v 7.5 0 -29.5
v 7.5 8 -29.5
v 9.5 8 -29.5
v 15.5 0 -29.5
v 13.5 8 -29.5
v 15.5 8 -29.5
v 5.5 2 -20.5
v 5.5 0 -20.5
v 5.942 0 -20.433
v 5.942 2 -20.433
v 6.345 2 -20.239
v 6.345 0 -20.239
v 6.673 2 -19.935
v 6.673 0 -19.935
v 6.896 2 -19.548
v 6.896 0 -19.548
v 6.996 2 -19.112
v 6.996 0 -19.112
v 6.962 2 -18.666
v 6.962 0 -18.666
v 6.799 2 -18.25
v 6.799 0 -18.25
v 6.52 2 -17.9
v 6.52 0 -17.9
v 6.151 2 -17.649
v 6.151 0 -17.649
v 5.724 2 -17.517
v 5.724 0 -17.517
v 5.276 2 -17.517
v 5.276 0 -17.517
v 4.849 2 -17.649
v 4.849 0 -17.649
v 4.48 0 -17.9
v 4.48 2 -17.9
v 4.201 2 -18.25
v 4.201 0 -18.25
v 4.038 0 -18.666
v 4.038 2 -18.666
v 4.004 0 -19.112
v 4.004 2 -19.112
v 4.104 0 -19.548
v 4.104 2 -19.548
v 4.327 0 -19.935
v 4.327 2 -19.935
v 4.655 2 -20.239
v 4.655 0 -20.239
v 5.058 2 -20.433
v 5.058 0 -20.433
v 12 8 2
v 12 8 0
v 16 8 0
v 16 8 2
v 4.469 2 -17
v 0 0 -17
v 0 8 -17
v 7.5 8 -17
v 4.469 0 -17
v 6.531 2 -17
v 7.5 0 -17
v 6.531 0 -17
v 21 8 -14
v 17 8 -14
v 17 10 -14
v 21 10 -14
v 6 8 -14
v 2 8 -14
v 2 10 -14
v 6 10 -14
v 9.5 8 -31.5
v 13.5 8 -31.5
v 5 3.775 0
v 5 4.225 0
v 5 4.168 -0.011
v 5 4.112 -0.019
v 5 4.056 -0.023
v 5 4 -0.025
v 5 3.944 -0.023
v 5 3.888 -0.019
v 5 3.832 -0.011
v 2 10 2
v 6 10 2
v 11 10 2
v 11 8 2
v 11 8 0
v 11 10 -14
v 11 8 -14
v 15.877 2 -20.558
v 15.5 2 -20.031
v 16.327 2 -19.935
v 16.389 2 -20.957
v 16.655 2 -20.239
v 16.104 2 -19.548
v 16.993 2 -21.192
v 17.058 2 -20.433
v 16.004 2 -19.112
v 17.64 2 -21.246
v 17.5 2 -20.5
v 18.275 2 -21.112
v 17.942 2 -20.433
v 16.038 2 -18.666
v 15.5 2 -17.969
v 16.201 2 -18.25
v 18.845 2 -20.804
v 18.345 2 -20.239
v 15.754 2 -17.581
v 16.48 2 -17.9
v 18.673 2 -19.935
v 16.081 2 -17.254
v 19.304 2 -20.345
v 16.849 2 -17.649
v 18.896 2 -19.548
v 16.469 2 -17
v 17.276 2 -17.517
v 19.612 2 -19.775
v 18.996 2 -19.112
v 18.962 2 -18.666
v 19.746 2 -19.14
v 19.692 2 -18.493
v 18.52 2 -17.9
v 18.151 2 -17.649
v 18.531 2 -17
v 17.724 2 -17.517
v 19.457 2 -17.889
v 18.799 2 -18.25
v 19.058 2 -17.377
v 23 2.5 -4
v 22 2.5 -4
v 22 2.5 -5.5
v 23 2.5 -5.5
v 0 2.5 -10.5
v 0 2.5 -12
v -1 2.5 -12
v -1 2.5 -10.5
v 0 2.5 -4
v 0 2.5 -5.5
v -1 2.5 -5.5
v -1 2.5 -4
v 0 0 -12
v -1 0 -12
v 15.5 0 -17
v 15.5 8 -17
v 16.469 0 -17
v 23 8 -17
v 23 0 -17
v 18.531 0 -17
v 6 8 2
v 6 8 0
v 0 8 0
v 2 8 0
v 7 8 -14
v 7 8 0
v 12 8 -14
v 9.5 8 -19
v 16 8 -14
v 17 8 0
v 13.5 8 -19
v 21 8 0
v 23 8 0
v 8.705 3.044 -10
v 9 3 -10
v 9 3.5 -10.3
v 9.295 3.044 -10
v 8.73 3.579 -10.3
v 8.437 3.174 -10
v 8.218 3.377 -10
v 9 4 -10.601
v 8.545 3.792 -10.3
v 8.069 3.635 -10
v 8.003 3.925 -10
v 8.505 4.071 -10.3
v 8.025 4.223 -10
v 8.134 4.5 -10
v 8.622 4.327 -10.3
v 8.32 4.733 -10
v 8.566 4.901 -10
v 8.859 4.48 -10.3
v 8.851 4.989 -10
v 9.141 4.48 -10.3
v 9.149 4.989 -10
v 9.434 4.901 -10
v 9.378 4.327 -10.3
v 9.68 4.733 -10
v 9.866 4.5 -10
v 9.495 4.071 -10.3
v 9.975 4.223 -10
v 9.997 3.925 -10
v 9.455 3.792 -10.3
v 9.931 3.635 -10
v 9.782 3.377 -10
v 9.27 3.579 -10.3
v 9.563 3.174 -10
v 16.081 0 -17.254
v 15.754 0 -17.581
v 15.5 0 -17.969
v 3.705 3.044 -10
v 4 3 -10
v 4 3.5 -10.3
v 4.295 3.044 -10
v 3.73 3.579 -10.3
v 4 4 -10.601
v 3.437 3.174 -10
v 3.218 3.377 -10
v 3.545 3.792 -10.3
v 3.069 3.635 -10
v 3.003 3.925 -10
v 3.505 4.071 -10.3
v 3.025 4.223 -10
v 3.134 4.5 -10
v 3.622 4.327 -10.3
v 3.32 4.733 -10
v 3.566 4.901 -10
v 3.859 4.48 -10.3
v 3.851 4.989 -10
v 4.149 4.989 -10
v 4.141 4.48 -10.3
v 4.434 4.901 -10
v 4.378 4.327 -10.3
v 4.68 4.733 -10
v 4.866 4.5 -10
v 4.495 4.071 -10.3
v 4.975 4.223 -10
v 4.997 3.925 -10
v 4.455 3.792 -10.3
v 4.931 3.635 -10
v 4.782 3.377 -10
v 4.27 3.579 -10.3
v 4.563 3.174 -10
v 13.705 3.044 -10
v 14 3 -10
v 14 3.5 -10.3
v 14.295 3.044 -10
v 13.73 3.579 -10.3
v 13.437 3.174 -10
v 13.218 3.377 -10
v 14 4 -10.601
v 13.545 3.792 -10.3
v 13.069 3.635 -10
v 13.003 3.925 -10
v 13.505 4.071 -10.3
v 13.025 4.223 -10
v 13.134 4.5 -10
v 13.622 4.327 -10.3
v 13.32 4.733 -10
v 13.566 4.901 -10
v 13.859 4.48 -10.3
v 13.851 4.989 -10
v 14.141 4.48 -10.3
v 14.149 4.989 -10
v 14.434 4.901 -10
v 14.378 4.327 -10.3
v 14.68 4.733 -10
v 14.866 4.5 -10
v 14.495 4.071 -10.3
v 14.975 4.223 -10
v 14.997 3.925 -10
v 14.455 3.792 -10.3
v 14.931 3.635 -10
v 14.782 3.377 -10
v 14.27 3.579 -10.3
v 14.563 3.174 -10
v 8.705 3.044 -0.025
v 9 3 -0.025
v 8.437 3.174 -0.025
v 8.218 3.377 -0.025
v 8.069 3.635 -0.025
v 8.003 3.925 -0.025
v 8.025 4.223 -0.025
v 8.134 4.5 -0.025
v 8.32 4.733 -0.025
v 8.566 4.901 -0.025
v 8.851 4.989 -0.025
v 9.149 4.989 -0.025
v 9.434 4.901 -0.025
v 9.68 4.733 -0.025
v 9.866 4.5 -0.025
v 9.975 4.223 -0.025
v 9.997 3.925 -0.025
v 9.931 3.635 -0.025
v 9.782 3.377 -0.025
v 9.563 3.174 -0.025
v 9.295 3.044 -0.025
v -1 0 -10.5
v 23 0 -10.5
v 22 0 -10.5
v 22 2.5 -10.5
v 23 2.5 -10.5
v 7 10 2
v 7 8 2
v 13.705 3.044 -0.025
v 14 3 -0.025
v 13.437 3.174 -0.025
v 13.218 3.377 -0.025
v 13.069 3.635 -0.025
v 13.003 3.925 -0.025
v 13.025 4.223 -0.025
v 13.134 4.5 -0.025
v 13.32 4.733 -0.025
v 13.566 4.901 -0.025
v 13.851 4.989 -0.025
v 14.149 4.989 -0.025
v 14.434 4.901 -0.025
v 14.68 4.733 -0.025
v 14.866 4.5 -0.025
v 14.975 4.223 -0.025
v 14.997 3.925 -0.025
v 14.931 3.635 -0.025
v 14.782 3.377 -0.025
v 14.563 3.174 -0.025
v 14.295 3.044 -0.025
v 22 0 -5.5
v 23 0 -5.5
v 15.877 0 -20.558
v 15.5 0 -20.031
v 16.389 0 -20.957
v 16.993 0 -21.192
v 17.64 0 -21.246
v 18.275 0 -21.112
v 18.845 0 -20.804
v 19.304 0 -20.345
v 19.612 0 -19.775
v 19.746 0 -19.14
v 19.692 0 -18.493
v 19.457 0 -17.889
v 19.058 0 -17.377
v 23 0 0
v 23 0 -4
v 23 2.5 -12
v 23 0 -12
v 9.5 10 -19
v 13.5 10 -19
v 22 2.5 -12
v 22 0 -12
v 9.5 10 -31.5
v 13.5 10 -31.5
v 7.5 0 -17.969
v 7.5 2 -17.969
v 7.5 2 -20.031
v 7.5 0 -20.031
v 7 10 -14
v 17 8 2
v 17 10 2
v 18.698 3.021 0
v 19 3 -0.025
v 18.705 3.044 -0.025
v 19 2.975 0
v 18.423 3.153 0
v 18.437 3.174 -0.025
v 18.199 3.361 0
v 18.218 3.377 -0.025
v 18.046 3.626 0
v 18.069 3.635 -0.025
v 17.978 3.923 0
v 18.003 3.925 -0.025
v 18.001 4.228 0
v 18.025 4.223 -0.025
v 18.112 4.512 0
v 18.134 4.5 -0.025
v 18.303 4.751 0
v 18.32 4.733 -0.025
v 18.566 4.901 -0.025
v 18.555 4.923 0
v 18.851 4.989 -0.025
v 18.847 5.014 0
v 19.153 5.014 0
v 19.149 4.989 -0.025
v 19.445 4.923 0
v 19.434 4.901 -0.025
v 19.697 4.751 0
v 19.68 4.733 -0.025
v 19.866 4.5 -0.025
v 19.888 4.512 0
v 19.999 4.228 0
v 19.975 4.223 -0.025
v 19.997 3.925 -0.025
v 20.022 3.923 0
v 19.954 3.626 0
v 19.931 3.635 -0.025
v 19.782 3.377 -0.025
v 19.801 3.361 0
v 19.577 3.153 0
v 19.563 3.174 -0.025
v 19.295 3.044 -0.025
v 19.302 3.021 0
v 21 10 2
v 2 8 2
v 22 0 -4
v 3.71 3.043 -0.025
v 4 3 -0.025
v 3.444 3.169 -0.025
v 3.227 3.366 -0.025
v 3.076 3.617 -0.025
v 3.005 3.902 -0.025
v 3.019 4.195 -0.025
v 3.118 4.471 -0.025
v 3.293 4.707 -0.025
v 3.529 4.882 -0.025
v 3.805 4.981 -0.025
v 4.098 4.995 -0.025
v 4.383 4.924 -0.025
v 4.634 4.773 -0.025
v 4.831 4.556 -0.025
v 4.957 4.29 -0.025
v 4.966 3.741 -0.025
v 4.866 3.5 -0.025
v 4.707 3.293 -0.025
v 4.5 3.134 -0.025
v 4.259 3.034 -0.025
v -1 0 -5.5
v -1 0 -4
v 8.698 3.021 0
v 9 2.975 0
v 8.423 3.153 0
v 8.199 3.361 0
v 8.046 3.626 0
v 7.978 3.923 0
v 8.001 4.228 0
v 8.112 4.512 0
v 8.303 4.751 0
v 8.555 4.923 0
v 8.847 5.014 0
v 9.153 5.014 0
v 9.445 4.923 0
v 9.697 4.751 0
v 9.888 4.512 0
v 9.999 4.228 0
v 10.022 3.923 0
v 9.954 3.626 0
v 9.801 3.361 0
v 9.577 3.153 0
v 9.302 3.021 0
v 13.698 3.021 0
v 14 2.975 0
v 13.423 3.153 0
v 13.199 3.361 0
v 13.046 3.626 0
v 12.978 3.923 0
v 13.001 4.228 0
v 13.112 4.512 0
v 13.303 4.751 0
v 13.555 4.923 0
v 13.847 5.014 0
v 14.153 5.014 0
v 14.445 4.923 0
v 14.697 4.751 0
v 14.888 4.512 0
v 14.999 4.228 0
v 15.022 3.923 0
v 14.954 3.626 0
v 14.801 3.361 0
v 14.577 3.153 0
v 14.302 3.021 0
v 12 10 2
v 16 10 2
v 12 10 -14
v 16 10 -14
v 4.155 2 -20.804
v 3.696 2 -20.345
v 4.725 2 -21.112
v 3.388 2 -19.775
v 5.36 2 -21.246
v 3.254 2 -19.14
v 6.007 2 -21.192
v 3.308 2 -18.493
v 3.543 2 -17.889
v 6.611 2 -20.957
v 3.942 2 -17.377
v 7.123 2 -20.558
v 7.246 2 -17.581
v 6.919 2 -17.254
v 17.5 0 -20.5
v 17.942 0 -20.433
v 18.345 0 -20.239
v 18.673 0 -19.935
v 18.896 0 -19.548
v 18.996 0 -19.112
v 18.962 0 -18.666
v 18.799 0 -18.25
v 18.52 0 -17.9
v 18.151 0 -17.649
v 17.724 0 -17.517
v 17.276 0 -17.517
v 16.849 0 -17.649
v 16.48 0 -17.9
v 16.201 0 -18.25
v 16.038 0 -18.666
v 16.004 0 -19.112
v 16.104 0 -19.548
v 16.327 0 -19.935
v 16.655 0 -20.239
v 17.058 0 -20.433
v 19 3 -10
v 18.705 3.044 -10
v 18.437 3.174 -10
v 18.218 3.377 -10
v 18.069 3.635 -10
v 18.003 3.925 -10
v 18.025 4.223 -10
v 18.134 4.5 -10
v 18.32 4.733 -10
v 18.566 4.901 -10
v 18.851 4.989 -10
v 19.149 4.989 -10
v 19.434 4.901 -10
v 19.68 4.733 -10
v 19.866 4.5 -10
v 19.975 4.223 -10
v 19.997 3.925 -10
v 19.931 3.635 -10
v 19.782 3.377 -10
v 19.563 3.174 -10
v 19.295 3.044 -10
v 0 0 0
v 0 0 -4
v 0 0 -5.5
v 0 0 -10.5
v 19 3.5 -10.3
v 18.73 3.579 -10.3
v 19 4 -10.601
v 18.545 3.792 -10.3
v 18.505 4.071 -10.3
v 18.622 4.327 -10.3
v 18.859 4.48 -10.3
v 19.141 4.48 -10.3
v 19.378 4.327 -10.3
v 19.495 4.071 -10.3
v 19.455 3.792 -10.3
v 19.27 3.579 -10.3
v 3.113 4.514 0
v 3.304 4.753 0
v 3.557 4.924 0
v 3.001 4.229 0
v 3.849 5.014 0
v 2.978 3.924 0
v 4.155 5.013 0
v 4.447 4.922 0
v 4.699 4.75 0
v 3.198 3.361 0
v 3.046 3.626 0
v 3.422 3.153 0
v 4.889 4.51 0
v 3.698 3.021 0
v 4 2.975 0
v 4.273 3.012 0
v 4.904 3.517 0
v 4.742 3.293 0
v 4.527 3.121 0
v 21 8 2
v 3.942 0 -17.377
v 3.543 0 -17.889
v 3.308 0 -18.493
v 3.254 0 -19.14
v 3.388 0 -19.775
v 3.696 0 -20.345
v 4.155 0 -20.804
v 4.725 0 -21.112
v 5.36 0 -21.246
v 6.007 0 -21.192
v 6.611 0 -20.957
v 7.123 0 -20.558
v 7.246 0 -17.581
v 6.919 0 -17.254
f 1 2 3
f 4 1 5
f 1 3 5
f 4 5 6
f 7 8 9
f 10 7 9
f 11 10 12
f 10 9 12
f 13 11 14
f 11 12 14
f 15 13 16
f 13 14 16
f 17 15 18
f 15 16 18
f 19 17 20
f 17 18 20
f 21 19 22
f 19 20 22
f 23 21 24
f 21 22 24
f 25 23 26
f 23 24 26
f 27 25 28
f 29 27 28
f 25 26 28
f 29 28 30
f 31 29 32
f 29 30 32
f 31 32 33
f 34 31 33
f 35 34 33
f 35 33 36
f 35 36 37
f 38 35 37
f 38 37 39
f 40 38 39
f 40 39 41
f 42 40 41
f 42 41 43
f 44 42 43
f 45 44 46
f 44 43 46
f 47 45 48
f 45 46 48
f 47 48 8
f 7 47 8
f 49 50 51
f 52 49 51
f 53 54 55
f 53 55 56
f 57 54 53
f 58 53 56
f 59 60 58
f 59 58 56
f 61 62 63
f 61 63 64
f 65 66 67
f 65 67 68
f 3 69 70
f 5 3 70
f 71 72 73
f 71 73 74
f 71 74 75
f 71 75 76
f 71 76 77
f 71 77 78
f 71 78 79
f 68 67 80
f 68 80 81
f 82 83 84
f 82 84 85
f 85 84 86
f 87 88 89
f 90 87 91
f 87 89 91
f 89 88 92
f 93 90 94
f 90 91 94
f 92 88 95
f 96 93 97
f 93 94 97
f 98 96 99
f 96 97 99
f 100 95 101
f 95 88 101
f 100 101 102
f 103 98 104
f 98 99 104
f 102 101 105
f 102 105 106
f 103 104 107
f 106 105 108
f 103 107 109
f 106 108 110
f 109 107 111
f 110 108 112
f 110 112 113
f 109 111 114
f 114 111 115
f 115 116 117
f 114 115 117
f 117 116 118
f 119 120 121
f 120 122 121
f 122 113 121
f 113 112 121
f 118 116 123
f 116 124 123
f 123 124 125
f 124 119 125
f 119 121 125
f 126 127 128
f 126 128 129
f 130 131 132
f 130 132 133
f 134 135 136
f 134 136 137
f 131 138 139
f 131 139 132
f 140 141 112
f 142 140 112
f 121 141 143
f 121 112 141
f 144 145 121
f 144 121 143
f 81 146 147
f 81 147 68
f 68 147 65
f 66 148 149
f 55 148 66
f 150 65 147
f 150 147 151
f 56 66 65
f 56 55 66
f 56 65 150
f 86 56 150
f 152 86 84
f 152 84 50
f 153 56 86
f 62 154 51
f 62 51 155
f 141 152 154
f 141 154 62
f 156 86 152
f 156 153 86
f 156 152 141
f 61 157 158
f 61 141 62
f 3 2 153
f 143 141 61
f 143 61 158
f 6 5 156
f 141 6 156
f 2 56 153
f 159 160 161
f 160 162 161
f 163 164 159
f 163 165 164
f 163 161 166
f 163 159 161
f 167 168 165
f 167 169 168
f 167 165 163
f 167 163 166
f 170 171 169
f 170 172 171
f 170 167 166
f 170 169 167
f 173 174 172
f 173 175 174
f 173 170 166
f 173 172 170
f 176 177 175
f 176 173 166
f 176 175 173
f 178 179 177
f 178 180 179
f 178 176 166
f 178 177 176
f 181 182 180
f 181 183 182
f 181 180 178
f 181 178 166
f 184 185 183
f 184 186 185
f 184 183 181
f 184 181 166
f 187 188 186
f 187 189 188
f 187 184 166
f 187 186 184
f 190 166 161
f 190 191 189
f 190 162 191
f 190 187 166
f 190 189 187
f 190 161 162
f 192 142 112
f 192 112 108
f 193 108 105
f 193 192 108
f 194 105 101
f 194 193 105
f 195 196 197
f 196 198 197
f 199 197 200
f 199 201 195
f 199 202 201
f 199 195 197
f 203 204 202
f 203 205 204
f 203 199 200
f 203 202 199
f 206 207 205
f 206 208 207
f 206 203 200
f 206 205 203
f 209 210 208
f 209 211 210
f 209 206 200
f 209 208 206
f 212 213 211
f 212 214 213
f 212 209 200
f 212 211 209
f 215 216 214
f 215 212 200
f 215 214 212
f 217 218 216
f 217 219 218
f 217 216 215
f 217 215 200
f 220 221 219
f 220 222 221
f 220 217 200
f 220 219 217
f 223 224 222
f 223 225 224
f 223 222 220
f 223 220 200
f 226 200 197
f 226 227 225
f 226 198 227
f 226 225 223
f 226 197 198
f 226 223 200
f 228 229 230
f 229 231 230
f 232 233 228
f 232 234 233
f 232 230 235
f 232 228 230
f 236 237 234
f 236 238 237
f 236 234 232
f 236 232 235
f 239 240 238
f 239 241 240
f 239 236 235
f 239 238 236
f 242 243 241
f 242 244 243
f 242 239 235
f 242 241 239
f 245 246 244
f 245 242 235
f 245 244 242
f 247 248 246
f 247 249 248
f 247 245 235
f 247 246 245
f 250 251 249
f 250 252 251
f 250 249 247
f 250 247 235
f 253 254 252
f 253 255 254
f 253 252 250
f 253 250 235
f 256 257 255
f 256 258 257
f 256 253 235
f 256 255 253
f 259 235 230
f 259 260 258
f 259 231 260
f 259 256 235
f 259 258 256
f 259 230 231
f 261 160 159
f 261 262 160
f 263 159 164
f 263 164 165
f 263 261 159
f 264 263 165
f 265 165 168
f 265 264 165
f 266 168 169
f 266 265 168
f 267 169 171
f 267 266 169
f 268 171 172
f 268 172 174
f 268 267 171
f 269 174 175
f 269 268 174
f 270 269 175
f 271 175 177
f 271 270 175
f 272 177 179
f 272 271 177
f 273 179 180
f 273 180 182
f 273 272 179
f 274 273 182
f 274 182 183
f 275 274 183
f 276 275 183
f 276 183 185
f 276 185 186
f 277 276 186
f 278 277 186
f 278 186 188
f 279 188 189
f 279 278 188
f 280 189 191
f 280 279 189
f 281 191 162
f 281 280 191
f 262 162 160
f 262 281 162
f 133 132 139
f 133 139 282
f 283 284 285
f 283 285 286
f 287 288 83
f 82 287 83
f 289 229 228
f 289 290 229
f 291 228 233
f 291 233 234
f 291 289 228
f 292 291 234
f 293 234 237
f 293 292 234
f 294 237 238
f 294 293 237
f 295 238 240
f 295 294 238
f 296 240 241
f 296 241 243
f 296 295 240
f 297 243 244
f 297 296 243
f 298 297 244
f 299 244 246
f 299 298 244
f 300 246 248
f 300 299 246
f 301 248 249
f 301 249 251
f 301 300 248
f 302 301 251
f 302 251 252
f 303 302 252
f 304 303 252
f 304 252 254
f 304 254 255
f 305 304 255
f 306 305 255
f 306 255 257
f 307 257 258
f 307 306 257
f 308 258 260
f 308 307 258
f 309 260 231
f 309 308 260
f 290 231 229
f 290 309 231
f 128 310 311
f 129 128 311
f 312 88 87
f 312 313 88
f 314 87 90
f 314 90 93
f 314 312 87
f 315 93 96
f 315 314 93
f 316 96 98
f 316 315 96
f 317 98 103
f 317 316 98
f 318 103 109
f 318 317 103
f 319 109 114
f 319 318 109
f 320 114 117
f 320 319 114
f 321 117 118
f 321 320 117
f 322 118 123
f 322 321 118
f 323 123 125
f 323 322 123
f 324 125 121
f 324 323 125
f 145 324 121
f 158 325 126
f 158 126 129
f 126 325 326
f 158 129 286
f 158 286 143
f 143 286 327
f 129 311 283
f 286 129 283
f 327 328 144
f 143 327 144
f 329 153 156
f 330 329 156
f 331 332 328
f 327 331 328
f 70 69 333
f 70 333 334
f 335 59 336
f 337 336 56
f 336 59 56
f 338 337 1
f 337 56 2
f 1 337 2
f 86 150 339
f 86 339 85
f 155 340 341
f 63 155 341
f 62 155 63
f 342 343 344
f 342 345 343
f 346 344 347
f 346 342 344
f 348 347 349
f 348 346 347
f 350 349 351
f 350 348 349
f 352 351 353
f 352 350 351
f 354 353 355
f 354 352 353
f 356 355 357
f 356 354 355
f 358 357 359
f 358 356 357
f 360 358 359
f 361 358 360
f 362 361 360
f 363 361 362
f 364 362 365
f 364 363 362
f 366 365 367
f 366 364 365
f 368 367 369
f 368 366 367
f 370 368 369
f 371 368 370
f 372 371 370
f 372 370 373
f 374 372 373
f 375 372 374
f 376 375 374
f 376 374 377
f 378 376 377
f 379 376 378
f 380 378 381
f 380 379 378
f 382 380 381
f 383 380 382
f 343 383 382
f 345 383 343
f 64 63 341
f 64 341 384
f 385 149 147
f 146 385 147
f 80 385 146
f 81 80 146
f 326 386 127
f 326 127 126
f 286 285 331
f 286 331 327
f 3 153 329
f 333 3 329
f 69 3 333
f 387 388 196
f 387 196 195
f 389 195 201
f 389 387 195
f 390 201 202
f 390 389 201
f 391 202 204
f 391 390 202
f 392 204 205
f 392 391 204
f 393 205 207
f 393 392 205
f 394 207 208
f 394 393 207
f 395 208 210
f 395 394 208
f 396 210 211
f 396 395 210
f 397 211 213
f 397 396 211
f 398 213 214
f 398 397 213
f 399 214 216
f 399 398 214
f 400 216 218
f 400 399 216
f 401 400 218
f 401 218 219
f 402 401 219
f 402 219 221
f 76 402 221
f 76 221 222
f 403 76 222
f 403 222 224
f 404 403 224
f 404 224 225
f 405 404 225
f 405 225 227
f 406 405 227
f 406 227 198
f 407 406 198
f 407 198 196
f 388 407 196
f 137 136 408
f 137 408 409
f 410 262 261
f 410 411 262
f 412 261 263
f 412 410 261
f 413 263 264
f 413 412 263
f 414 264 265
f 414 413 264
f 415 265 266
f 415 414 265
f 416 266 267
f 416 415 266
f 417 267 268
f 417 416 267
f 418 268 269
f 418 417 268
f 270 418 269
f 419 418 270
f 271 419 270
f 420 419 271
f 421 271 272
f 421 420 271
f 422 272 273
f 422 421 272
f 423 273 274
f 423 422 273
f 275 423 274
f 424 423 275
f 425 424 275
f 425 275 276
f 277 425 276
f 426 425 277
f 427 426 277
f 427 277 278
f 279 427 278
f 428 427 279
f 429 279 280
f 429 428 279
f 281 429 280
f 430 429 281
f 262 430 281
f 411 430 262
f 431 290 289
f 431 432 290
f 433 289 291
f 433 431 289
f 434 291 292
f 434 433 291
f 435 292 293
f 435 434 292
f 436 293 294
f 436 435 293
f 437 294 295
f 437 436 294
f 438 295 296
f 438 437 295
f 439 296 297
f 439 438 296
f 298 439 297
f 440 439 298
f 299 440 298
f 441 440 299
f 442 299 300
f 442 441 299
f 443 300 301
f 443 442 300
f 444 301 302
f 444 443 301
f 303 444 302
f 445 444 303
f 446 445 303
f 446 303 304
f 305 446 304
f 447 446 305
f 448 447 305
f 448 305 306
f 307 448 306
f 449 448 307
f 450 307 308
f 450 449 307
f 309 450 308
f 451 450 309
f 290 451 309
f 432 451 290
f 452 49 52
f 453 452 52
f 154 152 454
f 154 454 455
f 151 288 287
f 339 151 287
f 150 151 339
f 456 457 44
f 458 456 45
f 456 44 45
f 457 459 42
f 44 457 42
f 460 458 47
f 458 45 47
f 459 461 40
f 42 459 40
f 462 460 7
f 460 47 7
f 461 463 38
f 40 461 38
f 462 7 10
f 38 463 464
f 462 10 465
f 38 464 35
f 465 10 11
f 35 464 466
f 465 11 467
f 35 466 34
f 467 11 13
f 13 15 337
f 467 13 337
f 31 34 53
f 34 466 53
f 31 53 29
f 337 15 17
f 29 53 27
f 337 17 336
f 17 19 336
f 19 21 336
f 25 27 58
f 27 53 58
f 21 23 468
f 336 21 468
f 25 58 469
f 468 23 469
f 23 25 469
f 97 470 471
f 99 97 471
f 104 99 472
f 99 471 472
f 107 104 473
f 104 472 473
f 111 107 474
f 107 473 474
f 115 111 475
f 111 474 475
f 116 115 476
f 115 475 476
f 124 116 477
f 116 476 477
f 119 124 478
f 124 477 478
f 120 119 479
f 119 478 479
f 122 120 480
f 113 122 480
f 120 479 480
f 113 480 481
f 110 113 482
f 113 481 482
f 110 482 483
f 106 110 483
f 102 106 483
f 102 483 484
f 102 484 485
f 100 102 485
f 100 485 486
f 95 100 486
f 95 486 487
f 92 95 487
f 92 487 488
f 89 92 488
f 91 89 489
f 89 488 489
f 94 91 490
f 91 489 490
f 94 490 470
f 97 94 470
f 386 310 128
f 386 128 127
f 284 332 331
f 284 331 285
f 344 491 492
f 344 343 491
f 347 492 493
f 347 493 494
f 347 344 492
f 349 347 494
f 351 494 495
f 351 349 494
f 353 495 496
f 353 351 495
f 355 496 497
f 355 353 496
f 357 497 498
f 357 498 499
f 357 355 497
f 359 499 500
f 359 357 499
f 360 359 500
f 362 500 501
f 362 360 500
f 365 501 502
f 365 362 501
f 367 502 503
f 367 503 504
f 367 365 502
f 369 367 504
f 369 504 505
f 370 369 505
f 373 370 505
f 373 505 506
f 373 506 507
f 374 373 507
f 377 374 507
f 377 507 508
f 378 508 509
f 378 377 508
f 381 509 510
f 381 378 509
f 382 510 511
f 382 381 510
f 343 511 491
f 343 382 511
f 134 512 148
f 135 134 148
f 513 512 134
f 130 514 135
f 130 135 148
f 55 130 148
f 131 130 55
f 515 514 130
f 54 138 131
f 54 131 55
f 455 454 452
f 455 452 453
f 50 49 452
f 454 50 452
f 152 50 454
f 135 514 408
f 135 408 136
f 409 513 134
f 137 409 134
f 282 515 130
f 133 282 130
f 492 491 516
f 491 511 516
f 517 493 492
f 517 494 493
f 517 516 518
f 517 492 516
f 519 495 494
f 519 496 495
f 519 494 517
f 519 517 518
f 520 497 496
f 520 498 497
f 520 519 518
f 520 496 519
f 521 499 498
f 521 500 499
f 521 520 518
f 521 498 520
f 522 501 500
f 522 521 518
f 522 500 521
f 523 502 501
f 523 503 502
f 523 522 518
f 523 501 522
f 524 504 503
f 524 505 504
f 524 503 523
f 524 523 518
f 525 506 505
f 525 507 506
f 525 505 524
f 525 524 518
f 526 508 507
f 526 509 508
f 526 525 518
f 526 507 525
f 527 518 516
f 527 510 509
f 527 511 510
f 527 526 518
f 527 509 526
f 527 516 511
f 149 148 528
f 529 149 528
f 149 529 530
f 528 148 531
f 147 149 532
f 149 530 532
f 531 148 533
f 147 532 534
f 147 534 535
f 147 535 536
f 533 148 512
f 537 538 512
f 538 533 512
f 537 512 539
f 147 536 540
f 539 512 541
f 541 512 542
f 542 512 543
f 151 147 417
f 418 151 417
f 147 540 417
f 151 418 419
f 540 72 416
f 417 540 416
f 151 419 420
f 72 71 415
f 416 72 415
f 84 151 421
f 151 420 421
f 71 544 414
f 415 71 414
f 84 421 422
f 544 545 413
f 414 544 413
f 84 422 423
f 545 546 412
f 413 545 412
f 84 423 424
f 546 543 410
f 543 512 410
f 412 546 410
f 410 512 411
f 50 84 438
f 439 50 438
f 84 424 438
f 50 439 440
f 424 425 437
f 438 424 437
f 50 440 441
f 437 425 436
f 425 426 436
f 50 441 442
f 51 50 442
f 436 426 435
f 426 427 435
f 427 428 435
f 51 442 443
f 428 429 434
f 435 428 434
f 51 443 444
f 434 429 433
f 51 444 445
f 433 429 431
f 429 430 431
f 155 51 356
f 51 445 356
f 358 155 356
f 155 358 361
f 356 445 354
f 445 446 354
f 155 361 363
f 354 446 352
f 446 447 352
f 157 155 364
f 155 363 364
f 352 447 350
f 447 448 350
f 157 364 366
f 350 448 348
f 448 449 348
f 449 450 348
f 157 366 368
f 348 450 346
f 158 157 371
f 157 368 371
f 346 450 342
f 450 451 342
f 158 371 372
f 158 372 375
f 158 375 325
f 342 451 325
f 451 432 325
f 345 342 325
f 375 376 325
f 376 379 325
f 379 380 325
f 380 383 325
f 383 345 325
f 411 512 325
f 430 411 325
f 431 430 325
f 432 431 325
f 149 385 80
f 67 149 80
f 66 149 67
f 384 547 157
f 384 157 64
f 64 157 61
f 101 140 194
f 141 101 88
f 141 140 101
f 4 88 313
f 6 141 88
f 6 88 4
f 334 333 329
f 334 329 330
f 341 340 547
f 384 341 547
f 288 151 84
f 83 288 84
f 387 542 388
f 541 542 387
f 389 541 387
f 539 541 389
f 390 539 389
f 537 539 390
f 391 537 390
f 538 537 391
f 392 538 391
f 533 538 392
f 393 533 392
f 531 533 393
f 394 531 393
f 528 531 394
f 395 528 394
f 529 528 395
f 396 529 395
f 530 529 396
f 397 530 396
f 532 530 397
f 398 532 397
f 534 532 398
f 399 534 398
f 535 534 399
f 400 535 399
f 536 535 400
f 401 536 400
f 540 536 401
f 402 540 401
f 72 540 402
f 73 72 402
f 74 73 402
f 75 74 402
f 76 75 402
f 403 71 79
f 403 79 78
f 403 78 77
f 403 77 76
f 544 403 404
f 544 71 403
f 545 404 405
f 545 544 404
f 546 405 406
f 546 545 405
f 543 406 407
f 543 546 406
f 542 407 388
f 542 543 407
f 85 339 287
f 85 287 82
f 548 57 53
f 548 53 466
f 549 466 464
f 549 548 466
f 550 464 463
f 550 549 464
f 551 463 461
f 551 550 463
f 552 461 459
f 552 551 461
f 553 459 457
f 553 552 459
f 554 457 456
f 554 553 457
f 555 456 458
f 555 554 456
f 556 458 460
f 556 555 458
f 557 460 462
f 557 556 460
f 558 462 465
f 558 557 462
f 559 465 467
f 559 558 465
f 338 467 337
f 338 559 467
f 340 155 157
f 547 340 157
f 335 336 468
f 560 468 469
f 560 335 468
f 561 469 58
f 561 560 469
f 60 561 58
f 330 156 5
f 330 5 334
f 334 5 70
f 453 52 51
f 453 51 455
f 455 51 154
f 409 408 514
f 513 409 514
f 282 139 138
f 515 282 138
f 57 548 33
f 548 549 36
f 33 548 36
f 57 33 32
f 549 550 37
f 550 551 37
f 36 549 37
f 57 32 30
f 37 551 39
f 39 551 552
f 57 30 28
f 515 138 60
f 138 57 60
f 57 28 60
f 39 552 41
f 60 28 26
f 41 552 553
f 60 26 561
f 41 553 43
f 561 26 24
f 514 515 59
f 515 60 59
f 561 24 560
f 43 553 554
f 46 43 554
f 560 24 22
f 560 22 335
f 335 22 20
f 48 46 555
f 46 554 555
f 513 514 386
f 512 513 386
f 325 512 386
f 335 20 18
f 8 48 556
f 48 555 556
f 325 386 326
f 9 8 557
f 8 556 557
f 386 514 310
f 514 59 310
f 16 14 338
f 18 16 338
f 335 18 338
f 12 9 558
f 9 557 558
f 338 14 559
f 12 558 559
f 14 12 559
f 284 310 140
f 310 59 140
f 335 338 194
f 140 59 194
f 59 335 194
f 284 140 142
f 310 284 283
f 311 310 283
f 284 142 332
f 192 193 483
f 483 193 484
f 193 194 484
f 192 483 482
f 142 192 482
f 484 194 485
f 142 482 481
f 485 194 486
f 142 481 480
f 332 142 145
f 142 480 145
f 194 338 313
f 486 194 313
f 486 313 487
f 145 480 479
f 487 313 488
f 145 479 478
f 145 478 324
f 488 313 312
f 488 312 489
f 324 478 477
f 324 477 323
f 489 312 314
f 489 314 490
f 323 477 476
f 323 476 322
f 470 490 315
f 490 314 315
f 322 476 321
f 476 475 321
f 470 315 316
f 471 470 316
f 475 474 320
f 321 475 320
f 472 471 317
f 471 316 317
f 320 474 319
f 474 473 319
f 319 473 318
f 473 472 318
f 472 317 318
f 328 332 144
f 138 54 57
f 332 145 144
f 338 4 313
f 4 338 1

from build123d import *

# Parameters (mm, degrees)
SKETCH1_W                  = 8
SKETCH1_H                  = 17
CONNECTOR_BODY_DEPTH       = 8
SKETCH4_W                  = 4
SKETCH4_H                  = 16
CLAMP_DEPTH                = 2
CONNECTOR_PATTERN_COUNT    = 4
CONNECTOR_PATTERN_PITCH    = 5
SKETCH5_W                  = 8
SKETCH5_H                  = 12.5
SINGLE_BODY_DEPTH          = 8
SKETCH6_W                  = 1.5
SKETCH6_H                  = 2.500390225
CHAINING_NOBS_DEPTH        = 1
SKETCH7_W                  = 1
SKETCH7_H                  = 1.5
CHAINING_NOBS_CUTOUT_DEPTH = 2.50039
SKETCH8_W                  = 4
SKETCH8_H                  = 12.5
SINGLE_BODY_CLAMP_DEPTH    = 2
SKETCH9_R                  = 2.25
SKETCH9_R_2                = 1.5
MOUNTING_RINGS_DEPTH       = 2


with BuildPart() as part:
    # Sketch1 → connector_body (new body)
    with BuildSketch(Plane(origin=(0, 0, 0), x_dir=(1, 0, 0), z_dir=(0, 1, 0))):
        with Locations((4, 8.5)):
            Rectangle(SKETCH1_W, SKETCH1_H)
    connector_body = extrude(amount=CONNECTOR_BODY_DEPTH)

    # Sketch3 → cable_hole (revolve, cut)
    with BuildSketch(Plane(origin=(4, 4, 0), x_dir=(0, -1, 0), z_dir=(1, 0, 0))):
        Polygon((0, 0), (0, 10.600860619), (1, 10), (1, 0.025), (1.025, 0), align=None)
    cable_hole = revolve(axis=Axis((4, 4, 6.35), (0, 0, -1)), mode=Mode.SUBTRACT)

    # Sketch4 → clamp (add)
    with BuildSketch(Plane(origin=(0, 8, 0), x_dir=(1, 0, 0), z_dir=(0, 1, 0))):
        with Locations((4, 6)):
            Rectangle(SKETCH4_W, SKETCH4_H)
    clamp = extrude(amount=CLAMP_DEPTH)

    # connector_pattern: connector_body, cable_hole, clamp ×4
    with Locations(*[(i * CONNECTOR_PATTERN_PITCH, 0, 0) for i in range(1, CONNECTOR_PATTERN_COUNT)]):
        add(connector_body)
        add(cable_hole, mode=Mode.SUBTRACT)
        add(clamp)

    # Sketch5 → single_body (add)
    with BuildSketch(Plane(origin=(0, 8, 0), x_dir=(1, 0, 0), z_dir=(0, 1, 0))):
        with Locations((11.5, 23.25)):
            Rectangle(SKETCH5_W, SKETCH5_H)
    extrude(amount=-SINGLE_BODY_DEPTH)

    # Sketch6 → chaining_nobs (add)
    with BuildSketch(Plane.ZY):
        with Locations((-11.25, 1.250195113)):
            Rectangle(SKETCH6_W, SKETCH6_H)
        with Locations((-4.75, 1.250195113)):
            Rectangle(SKETCH6_W, SKETCH6_H)
    extrude(amount=CHAINING_NOBS_DEPTH)

    # Sketch7 → chaining_nobs_cutout (cut)
    with BuildSketch(Plane.XZ):
        with Locations((22.5, -4.75)):
            Rectangle(SKETCH7_W, SKETCH7_H)
        with Locations((22.5, -11.25)):
            Rectangle(SKETCH7_W, SKETCH7_H)
    extrude(amount=-CHAINING_NOBS_CUTOUT_DEPTH, mode=Mode.SUBTRACT)

    # Sketch8 → single_body_clamp (add)
    with BuildSketch(Plane(origin=(0, 8, 0), x_dir=(1, 0, 0), z_dir=(0, 1, 0))):
        with Locations((11.5, 25.25)):
            Rectangle(SKETCH8_W, SKETCH8_H)
    extrude(amount=SINGLE_BODY_CLAMP_DEPTH)

    # Sketch9 → mounting_rings (add)
    # profile 1 of 2: a face of its own
    with BuildSketch(Plane.XZ):
        with Locations((5.5, -19)):
            Circle(SKETCH9_R)
        with Locations(Location((5.5, -19, 0), (0, 0, 270))):
            Circle(SKETCH9_R_2, mode=Mode.SUBTRACT)
    # profile 2 of 2: a face of its own
    with BuildSketch(Plane.XZ):
        with Locations((17.5, -19)):
            Circle(SKETCH9_R)
        with Locations(Location((17.5, -19, 0), (0, 0, 270))):
            Circle(SKETCH9_R_2, mode=Mode.SUBTRACT)
    extrude(amount=-MOUNTING_RINGS_DEPTH)


solid = part.part
